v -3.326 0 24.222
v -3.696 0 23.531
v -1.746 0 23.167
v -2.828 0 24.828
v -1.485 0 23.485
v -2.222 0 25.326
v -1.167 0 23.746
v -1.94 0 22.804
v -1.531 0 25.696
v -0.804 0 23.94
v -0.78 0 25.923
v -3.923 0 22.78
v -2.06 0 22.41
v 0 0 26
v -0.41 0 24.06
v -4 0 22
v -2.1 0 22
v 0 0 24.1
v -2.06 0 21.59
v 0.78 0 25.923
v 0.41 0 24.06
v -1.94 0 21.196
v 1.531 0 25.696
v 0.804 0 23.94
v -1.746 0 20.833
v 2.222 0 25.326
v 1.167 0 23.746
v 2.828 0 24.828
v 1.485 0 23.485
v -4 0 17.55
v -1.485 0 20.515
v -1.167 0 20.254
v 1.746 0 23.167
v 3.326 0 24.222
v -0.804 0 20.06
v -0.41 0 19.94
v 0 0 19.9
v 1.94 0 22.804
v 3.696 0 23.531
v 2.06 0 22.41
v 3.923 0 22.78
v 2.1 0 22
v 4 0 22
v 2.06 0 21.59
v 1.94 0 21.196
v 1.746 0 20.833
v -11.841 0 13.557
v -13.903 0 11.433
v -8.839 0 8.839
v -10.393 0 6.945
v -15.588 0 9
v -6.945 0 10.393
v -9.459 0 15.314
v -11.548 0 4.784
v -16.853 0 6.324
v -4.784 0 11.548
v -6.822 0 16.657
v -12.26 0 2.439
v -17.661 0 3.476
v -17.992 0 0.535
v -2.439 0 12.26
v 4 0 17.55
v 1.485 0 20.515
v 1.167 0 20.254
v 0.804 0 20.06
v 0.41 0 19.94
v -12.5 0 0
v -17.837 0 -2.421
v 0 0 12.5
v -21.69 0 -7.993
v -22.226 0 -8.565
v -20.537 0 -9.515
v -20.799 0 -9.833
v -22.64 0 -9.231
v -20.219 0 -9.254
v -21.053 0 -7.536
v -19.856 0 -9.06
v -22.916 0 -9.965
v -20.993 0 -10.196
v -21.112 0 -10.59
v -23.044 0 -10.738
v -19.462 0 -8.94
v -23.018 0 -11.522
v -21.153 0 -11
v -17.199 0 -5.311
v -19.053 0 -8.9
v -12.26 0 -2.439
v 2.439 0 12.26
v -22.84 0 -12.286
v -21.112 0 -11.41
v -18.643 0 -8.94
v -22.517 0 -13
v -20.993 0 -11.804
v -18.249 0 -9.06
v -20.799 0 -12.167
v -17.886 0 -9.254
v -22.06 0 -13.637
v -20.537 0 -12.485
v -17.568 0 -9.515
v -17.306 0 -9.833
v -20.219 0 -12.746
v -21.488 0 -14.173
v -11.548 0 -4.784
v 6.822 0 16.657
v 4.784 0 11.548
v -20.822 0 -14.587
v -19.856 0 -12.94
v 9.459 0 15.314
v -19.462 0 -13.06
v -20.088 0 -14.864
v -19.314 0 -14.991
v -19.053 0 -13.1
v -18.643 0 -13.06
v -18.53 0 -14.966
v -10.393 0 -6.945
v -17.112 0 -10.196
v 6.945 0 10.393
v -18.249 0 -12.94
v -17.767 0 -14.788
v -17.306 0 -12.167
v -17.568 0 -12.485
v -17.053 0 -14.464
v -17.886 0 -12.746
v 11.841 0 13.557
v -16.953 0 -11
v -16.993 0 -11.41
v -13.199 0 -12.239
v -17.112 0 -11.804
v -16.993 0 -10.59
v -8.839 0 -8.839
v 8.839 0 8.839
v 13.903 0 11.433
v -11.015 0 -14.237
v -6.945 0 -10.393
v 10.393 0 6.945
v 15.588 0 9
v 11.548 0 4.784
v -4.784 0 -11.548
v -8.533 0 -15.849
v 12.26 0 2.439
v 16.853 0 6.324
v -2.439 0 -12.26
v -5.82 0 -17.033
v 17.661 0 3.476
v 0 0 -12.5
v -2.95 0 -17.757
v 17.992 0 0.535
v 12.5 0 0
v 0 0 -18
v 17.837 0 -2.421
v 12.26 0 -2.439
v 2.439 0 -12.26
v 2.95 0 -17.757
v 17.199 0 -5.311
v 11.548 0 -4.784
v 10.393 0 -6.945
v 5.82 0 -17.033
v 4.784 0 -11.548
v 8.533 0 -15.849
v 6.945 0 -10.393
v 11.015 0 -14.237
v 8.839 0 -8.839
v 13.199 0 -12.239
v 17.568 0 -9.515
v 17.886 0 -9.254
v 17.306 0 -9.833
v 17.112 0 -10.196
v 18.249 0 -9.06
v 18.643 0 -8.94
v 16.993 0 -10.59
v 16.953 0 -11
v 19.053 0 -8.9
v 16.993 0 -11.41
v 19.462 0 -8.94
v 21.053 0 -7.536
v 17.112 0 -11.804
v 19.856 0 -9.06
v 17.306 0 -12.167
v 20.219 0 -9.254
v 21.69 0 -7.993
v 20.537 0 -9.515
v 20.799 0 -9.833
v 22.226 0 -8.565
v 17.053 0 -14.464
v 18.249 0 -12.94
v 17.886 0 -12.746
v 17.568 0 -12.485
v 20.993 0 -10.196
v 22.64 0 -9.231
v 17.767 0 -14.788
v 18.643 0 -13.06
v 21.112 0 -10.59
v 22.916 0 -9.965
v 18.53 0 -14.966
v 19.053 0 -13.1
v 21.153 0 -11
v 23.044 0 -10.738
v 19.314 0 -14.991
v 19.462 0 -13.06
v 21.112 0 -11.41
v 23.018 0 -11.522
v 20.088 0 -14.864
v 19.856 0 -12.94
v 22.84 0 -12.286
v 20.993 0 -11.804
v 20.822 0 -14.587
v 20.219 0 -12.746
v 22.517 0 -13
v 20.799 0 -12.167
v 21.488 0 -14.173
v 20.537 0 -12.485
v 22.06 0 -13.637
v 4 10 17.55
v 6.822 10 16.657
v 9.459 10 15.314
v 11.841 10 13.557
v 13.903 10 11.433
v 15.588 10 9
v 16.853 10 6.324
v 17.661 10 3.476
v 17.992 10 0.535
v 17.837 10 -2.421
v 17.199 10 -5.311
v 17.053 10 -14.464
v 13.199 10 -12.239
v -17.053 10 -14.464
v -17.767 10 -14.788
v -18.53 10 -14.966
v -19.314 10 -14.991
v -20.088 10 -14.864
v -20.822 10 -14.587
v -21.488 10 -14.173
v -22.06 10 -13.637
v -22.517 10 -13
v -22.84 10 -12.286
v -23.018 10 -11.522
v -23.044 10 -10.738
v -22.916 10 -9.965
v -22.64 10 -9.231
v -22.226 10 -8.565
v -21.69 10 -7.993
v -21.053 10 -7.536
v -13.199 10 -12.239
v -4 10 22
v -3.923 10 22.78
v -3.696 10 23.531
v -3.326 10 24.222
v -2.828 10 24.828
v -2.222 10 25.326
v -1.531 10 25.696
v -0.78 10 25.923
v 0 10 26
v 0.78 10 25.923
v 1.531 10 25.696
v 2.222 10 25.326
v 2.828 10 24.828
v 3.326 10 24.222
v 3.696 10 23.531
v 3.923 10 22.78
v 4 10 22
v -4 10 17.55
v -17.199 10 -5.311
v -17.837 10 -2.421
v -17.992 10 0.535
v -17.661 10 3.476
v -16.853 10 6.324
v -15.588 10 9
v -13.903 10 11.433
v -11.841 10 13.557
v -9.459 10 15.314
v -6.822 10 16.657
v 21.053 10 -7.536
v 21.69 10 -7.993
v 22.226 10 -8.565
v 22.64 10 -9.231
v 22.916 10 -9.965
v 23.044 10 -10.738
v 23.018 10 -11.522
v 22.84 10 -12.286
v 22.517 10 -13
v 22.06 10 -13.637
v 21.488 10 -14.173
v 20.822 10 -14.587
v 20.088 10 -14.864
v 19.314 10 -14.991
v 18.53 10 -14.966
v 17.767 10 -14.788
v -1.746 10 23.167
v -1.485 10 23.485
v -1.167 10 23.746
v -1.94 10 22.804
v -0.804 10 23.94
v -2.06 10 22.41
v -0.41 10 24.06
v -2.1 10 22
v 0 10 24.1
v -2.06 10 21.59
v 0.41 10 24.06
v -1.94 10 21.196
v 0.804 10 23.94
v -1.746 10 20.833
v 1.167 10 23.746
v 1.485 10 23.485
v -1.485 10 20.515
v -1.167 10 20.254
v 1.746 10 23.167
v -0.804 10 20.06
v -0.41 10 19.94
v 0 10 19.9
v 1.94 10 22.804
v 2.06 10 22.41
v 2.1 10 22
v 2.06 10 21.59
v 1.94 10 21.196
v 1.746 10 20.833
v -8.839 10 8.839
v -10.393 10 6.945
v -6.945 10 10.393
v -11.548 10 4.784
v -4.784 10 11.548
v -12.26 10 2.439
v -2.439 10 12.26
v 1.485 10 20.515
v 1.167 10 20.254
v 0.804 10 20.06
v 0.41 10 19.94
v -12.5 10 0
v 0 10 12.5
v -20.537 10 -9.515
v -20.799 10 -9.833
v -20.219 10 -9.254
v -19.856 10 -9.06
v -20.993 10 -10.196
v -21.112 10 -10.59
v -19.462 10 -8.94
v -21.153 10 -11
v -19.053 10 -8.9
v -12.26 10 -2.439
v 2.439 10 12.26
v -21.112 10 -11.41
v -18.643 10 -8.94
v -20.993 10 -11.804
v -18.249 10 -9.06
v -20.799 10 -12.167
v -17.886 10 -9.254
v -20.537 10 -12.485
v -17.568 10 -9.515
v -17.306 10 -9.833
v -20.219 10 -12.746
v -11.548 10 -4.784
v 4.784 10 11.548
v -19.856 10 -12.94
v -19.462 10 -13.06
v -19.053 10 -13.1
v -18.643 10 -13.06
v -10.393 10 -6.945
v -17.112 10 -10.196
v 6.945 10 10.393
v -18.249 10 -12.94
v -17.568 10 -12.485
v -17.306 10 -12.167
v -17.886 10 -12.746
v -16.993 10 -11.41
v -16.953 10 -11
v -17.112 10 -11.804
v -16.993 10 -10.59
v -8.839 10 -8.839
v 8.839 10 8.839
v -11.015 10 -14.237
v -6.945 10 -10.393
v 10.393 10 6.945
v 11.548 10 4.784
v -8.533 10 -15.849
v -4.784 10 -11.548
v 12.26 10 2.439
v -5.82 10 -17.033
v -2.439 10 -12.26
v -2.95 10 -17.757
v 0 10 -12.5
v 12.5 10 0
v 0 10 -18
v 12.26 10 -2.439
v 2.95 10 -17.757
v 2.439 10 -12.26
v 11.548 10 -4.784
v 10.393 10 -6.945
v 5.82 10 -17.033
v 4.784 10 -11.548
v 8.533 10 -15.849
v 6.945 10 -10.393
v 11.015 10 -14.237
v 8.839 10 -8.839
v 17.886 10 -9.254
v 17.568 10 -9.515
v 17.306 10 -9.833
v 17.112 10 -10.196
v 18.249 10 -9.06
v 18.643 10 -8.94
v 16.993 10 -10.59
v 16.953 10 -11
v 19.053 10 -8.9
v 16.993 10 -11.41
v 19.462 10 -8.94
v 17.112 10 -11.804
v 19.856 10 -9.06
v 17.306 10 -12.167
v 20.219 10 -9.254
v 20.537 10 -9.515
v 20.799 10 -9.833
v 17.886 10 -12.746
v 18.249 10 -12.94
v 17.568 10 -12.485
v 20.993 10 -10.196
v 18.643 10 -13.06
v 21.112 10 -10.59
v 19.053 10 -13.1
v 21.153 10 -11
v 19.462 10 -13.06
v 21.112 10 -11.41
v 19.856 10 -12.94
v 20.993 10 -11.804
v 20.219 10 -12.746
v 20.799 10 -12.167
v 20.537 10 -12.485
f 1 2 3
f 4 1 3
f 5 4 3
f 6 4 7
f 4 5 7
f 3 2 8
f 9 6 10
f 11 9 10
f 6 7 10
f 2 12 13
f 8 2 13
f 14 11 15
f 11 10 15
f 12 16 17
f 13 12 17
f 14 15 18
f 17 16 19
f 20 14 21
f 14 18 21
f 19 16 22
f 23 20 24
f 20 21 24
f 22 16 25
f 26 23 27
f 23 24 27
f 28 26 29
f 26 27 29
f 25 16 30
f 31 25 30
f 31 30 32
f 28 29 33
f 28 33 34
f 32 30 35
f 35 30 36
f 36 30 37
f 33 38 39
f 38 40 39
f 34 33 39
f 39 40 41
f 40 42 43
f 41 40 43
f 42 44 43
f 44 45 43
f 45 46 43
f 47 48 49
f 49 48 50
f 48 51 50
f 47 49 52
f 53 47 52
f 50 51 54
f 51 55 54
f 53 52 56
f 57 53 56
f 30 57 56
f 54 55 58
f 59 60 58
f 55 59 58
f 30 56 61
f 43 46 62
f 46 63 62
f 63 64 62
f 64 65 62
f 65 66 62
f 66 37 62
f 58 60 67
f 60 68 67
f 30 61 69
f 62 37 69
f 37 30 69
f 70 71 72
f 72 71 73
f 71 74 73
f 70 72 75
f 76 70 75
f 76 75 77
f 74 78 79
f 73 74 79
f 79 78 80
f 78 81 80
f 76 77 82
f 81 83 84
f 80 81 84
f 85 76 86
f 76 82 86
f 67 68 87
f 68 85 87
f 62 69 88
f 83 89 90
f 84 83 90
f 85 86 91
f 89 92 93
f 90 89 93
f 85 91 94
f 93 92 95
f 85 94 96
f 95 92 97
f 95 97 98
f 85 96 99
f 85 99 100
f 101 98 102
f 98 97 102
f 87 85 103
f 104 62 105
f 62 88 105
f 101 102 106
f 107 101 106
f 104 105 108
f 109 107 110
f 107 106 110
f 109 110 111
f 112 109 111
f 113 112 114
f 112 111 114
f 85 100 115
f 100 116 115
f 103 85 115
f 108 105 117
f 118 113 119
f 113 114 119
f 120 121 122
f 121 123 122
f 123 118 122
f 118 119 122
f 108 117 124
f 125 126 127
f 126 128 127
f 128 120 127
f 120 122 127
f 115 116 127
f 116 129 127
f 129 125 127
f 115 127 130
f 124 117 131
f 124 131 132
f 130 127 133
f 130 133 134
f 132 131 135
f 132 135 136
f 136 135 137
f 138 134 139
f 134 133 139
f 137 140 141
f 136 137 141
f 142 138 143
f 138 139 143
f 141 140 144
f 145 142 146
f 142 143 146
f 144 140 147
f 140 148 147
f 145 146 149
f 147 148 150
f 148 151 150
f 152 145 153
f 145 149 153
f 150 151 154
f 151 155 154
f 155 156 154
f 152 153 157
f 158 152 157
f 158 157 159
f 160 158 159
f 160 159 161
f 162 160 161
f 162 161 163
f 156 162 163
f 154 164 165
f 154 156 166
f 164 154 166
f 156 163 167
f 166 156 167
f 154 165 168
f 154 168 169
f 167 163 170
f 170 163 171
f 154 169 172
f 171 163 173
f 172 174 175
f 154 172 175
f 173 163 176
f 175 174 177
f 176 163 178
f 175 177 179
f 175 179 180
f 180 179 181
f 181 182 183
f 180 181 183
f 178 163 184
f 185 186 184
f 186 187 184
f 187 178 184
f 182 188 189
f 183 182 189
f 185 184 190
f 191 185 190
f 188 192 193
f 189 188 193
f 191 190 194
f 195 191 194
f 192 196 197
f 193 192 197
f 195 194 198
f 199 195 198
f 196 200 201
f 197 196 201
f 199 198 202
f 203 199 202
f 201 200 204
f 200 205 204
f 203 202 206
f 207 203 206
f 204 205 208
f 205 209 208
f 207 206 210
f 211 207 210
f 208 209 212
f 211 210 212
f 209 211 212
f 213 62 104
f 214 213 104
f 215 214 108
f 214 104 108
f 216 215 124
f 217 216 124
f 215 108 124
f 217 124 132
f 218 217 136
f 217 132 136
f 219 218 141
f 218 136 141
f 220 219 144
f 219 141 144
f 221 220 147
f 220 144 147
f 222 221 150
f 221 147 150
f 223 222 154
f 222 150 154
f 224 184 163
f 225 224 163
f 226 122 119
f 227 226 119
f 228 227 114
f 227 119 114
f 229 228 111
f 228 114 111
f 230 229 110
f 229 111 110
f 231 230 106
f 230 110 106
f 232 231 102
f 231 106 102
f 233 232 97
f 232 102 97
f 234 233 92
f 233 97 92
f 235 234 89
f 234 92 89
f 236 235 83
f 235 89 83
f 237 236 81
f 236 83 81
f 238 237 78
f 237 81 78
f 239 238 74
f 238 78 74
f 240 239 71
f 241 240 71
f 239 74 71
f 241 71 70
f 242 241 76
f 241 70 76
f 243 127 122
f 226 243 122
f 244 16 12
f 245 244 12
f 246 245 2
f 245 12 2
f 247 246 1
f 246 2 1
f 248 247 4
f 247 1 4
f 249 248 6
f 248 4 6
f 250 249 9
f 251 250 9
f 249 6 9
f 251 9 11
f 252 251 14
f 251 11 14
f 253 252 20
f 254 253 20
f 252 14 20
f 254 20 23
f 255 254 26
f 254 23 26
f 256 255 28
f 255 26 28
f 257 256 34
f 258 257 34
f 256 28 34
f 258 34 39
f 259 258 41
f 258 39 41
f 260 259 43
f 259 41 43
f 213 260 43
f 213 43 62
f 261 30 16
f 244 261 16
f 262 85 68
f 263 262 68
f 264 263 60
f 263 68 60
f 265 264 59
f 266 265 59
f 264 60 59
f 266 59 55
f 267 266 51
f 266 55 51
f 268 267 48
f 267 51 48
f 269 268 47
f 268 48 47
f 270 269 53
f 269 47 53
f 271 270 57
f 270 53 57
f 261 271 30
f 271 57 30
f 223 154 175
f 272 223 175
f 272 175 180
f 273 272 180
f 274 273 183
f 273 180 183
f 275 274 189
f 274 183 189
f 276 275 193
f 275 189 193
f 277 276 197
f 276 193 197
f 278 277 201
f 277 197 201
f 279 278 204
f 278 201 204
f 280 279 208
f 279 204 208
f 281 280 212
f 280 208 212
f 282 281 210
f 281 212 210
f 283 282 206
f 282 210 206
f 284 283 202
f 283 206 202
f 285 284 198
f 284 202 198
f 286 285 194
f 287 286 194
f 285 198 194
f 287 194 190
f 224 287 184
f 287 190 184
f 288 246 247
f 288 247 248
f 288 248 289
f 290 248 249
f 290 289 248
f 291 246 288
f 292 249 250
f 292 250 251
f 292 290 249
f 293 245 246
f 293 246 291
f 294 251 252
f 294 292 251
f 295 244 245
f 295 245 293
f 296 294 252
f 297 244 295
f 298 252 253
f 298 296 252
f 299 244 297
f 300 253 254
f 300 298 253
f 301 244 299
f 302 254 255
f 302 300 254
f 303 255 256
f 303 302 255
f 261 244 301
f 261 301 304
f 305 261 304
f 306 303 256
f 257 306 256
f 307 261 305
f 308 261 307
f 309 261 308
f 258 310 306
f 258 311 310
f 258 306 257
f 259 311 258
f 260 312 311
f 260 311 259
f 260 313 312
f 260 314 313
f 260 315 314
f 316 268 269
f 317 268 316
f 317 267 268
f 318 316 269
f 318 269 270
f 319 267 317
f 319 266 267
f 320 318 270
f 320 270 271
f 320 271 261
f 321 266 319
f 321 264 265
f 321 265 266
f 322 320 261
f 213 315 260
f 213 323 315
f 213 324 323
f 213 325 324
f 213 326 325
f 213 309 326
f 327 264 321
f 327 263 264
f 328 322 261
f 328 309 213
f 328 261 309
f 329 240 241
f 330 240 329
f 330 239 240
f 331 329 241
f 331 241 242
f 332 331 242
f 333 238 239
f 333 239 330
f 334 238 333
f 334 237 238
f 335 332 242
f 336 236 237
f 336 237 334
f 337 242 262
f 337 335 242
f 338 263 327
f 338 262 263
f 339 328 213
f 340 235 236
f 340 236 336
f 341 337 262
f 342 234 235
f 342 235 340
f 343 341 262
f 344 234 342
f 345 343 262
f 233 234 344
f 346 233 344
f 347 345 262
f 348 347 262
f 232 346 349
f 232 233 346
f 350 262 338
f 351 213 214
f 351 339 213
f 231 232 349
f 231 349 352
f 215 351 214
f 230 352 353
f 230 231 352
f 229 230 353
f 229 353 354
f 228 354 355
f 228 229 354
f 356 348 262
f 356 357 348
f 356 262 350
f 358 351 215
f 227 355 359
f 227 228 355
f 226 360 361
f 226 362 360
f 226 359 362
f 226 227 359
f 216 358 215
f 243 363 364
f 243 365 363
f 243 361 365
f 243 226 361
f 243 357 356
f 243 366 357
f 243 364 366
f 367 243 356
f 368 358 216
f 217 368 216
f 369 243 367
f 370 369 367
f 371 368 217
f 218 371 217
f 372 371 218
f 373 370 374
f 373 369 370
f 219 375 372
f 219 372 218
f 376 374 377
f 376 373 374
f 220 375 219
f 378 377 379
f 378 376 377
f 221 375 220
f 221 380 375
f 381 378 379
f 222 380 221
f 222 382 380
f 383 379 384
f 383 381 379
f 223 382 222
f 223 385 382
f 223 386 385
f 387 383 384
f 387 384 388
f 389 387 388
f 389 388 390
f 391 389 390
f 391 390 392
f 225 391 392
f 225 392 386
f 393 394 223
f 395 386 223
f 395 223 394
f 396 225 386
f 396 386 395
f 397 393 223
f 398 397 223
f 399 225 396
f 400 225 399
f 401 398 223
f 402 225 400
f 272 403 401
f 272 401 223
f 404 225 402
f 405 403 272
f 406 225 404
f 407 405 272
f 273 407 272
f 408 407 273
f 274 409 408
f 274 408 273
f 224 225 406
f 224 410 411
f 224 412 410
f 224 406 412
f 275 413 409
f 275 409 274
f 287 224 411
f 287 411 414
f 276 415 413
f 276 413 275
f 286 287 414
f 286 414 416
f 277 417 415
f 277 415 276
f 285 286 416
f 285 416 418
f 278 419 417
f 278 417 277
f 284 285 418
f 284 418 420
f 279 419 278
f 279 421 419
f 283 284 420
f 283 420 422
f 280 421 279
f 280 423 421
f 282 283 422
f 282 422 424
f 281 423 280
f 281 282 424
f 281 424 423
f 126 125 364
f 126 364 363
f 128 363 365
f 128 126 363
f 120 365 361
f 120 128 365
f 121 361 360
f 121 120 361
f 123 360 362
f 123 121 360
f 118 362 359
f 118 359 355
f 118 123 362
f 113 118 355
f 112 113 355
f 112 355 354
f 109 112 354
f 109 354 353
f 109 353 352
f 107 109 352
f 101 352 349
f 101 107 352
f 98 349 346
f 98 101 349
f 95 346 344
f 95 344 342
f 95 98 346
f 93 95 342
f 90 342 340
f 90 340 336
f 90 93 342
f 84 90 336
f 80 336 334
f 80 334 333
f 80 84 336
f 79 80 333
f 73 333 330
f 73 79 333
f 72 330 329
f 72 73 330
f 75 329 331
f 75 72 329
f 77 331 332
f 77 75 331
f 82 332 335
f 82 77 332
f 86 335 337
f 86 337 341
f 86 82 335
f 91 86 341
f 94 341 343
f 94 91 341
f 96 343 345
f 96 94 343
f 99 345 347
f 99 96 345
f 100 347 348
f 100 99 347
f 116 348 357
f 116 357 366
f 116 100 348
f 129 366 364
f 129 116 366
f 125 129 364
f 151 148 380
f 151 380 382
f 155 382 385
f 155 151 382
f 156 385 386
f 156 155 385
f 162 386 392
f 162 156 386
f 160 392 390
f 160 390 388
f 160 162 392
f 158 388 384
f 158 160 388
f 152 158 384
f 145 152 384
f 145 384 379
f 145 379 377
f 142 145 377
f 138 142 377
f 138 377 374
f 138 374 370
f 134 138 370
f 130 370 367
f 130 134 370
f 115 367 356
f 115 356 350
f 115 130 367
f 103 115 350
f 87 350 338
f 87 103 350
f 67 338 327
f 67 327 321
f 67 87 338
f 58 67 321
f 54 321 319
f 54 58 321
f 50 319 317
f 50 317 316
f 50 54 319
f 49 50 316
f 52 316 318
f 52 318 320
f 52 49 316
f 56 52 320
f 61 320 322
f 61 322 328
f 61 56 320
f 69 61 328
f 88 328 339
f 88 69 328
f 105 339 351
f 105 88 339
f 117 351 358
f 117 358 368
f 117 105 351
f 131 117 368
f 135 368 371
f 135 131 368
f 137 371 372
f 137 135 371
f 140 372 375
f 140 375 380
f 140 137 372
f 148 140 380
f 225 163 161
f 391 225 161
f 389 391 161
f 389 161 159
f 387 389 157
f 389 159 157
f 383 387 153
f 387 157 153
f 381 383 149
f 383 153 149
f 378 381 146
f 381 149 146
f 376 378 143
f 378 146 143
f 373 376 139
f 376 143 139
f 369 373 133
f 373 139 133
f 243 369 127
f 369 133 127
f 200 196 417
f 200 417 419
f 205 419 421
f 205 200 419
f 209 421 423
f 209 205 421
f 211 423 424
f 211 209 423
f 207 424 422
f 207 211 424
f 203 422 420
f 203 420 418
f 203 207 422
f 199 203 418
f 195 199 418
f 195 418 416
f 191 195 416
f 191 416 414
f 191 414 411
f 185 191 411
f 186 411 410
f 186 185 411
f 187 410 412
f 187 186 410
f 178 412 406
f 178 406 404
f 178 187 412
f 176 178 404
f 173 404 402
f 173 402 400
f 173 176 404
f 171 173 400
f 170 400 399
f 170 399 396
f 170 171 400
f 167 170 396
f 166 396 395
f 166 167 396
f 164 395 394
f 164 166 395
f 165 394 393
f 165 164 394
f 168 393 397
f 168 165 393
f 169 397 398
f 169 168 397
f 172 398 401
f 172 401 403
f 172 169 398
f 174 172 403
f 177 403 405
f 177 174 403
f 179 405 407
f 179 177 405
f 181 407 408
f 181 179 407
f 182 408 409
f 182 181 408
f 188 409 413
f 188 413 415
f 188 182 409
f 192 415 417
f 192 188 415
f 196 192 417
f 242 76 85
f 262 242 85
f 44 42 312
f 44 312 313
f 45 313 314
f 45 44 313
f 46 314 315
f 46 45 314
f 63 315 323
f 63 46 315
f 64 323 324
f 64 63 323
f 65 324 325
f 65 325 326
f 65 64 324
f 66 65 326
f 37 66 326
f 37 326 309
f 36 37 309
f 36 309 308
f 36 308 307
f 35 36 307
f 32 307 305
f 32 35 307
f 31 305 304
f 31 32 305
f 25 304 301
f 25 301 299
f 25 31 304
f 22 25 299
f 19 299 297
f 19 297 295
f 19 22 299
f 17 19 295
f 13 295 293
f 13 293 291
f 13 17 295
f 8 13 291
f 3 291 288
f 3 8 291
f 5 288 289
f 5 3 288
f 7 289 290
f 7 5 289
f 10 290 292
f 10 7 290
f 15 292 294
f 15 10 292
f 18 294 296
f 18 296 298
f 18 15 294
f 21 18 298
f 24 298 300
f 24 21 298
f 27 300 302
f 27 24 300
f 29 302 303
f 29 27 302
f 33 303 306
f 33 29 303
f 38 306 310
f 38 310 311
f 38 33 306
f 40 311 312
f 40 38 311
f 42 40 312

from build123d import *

# Parameters (mm, degrees)
SKETCH1_R           = 2.1
SKETCH1_R_2         = 12.5
BOSS_EXTRUDE1_DEPTH = 10


with BuildPart() as part:
    # Sketch1 → Boss-Extrude1 (new body)
    with BuildSketch(Plane(origin=(0, 0, 0), x_dir=(1, 0, 0), z_dir=(0, 1, 0))):
        with BuildLine():
            ThreePointArc((-4, -22), (0, -26), (4, -22))
            Line((4, -22), (4, -17.549928775))
            ThreePointArc((4, -17.549928775), (15.588457268, -9), (17.198684154, 5.310862772))
            Line((17.198684154, 5.310862772), (21.052558883, 7.535898385))
            ThreePointArc((21.052558883, 7.535898385), (22.516660498, 13), (17.052558883, 14.464101615))
            Line((17.052558883, 14.464101615), (13.198684154, 12.239066003))
            ThreePointArc((13.198684154, 12.239066003), (0, 18), (-13.198684154, 12.239066003))
            Line((-13.198684154, 12.239066003), (-17.052558883, 14.464101615))
            ThreePointArc((-17.052558883, 14.464101615), (-22.516660498, 13), (-21.052558883, 7.535898385))
            Line((-21.052558883, 7.535898385), (-17.198684154, 5.310862772))
            ThreePointArc((-17.198684154, 5.310862772), (-15.588457268, -9), (-4, -17.549928775))
            Line((-4, -17.549928775), (-4, -22))
        make_face()
        with Locations((0, -22)):
            Circle(SKETCH1_R, mode=Mode.SUBTRACT)
        Circle(SKETCH1_R_2, mode=Mode.SUBTRACT)
        with Locations((19.052558883, 11)):
            Circle(SKETCH1_R, mode=Mode.SUBTRACT)
        with Locations((-19.052558883, 11)):
            Circle(SKETCH1_R, mode=Mode.SUBTRACT)
    extrude(amount=BOSS_EXTRUDE1_DEPTH)


solid = part.part
